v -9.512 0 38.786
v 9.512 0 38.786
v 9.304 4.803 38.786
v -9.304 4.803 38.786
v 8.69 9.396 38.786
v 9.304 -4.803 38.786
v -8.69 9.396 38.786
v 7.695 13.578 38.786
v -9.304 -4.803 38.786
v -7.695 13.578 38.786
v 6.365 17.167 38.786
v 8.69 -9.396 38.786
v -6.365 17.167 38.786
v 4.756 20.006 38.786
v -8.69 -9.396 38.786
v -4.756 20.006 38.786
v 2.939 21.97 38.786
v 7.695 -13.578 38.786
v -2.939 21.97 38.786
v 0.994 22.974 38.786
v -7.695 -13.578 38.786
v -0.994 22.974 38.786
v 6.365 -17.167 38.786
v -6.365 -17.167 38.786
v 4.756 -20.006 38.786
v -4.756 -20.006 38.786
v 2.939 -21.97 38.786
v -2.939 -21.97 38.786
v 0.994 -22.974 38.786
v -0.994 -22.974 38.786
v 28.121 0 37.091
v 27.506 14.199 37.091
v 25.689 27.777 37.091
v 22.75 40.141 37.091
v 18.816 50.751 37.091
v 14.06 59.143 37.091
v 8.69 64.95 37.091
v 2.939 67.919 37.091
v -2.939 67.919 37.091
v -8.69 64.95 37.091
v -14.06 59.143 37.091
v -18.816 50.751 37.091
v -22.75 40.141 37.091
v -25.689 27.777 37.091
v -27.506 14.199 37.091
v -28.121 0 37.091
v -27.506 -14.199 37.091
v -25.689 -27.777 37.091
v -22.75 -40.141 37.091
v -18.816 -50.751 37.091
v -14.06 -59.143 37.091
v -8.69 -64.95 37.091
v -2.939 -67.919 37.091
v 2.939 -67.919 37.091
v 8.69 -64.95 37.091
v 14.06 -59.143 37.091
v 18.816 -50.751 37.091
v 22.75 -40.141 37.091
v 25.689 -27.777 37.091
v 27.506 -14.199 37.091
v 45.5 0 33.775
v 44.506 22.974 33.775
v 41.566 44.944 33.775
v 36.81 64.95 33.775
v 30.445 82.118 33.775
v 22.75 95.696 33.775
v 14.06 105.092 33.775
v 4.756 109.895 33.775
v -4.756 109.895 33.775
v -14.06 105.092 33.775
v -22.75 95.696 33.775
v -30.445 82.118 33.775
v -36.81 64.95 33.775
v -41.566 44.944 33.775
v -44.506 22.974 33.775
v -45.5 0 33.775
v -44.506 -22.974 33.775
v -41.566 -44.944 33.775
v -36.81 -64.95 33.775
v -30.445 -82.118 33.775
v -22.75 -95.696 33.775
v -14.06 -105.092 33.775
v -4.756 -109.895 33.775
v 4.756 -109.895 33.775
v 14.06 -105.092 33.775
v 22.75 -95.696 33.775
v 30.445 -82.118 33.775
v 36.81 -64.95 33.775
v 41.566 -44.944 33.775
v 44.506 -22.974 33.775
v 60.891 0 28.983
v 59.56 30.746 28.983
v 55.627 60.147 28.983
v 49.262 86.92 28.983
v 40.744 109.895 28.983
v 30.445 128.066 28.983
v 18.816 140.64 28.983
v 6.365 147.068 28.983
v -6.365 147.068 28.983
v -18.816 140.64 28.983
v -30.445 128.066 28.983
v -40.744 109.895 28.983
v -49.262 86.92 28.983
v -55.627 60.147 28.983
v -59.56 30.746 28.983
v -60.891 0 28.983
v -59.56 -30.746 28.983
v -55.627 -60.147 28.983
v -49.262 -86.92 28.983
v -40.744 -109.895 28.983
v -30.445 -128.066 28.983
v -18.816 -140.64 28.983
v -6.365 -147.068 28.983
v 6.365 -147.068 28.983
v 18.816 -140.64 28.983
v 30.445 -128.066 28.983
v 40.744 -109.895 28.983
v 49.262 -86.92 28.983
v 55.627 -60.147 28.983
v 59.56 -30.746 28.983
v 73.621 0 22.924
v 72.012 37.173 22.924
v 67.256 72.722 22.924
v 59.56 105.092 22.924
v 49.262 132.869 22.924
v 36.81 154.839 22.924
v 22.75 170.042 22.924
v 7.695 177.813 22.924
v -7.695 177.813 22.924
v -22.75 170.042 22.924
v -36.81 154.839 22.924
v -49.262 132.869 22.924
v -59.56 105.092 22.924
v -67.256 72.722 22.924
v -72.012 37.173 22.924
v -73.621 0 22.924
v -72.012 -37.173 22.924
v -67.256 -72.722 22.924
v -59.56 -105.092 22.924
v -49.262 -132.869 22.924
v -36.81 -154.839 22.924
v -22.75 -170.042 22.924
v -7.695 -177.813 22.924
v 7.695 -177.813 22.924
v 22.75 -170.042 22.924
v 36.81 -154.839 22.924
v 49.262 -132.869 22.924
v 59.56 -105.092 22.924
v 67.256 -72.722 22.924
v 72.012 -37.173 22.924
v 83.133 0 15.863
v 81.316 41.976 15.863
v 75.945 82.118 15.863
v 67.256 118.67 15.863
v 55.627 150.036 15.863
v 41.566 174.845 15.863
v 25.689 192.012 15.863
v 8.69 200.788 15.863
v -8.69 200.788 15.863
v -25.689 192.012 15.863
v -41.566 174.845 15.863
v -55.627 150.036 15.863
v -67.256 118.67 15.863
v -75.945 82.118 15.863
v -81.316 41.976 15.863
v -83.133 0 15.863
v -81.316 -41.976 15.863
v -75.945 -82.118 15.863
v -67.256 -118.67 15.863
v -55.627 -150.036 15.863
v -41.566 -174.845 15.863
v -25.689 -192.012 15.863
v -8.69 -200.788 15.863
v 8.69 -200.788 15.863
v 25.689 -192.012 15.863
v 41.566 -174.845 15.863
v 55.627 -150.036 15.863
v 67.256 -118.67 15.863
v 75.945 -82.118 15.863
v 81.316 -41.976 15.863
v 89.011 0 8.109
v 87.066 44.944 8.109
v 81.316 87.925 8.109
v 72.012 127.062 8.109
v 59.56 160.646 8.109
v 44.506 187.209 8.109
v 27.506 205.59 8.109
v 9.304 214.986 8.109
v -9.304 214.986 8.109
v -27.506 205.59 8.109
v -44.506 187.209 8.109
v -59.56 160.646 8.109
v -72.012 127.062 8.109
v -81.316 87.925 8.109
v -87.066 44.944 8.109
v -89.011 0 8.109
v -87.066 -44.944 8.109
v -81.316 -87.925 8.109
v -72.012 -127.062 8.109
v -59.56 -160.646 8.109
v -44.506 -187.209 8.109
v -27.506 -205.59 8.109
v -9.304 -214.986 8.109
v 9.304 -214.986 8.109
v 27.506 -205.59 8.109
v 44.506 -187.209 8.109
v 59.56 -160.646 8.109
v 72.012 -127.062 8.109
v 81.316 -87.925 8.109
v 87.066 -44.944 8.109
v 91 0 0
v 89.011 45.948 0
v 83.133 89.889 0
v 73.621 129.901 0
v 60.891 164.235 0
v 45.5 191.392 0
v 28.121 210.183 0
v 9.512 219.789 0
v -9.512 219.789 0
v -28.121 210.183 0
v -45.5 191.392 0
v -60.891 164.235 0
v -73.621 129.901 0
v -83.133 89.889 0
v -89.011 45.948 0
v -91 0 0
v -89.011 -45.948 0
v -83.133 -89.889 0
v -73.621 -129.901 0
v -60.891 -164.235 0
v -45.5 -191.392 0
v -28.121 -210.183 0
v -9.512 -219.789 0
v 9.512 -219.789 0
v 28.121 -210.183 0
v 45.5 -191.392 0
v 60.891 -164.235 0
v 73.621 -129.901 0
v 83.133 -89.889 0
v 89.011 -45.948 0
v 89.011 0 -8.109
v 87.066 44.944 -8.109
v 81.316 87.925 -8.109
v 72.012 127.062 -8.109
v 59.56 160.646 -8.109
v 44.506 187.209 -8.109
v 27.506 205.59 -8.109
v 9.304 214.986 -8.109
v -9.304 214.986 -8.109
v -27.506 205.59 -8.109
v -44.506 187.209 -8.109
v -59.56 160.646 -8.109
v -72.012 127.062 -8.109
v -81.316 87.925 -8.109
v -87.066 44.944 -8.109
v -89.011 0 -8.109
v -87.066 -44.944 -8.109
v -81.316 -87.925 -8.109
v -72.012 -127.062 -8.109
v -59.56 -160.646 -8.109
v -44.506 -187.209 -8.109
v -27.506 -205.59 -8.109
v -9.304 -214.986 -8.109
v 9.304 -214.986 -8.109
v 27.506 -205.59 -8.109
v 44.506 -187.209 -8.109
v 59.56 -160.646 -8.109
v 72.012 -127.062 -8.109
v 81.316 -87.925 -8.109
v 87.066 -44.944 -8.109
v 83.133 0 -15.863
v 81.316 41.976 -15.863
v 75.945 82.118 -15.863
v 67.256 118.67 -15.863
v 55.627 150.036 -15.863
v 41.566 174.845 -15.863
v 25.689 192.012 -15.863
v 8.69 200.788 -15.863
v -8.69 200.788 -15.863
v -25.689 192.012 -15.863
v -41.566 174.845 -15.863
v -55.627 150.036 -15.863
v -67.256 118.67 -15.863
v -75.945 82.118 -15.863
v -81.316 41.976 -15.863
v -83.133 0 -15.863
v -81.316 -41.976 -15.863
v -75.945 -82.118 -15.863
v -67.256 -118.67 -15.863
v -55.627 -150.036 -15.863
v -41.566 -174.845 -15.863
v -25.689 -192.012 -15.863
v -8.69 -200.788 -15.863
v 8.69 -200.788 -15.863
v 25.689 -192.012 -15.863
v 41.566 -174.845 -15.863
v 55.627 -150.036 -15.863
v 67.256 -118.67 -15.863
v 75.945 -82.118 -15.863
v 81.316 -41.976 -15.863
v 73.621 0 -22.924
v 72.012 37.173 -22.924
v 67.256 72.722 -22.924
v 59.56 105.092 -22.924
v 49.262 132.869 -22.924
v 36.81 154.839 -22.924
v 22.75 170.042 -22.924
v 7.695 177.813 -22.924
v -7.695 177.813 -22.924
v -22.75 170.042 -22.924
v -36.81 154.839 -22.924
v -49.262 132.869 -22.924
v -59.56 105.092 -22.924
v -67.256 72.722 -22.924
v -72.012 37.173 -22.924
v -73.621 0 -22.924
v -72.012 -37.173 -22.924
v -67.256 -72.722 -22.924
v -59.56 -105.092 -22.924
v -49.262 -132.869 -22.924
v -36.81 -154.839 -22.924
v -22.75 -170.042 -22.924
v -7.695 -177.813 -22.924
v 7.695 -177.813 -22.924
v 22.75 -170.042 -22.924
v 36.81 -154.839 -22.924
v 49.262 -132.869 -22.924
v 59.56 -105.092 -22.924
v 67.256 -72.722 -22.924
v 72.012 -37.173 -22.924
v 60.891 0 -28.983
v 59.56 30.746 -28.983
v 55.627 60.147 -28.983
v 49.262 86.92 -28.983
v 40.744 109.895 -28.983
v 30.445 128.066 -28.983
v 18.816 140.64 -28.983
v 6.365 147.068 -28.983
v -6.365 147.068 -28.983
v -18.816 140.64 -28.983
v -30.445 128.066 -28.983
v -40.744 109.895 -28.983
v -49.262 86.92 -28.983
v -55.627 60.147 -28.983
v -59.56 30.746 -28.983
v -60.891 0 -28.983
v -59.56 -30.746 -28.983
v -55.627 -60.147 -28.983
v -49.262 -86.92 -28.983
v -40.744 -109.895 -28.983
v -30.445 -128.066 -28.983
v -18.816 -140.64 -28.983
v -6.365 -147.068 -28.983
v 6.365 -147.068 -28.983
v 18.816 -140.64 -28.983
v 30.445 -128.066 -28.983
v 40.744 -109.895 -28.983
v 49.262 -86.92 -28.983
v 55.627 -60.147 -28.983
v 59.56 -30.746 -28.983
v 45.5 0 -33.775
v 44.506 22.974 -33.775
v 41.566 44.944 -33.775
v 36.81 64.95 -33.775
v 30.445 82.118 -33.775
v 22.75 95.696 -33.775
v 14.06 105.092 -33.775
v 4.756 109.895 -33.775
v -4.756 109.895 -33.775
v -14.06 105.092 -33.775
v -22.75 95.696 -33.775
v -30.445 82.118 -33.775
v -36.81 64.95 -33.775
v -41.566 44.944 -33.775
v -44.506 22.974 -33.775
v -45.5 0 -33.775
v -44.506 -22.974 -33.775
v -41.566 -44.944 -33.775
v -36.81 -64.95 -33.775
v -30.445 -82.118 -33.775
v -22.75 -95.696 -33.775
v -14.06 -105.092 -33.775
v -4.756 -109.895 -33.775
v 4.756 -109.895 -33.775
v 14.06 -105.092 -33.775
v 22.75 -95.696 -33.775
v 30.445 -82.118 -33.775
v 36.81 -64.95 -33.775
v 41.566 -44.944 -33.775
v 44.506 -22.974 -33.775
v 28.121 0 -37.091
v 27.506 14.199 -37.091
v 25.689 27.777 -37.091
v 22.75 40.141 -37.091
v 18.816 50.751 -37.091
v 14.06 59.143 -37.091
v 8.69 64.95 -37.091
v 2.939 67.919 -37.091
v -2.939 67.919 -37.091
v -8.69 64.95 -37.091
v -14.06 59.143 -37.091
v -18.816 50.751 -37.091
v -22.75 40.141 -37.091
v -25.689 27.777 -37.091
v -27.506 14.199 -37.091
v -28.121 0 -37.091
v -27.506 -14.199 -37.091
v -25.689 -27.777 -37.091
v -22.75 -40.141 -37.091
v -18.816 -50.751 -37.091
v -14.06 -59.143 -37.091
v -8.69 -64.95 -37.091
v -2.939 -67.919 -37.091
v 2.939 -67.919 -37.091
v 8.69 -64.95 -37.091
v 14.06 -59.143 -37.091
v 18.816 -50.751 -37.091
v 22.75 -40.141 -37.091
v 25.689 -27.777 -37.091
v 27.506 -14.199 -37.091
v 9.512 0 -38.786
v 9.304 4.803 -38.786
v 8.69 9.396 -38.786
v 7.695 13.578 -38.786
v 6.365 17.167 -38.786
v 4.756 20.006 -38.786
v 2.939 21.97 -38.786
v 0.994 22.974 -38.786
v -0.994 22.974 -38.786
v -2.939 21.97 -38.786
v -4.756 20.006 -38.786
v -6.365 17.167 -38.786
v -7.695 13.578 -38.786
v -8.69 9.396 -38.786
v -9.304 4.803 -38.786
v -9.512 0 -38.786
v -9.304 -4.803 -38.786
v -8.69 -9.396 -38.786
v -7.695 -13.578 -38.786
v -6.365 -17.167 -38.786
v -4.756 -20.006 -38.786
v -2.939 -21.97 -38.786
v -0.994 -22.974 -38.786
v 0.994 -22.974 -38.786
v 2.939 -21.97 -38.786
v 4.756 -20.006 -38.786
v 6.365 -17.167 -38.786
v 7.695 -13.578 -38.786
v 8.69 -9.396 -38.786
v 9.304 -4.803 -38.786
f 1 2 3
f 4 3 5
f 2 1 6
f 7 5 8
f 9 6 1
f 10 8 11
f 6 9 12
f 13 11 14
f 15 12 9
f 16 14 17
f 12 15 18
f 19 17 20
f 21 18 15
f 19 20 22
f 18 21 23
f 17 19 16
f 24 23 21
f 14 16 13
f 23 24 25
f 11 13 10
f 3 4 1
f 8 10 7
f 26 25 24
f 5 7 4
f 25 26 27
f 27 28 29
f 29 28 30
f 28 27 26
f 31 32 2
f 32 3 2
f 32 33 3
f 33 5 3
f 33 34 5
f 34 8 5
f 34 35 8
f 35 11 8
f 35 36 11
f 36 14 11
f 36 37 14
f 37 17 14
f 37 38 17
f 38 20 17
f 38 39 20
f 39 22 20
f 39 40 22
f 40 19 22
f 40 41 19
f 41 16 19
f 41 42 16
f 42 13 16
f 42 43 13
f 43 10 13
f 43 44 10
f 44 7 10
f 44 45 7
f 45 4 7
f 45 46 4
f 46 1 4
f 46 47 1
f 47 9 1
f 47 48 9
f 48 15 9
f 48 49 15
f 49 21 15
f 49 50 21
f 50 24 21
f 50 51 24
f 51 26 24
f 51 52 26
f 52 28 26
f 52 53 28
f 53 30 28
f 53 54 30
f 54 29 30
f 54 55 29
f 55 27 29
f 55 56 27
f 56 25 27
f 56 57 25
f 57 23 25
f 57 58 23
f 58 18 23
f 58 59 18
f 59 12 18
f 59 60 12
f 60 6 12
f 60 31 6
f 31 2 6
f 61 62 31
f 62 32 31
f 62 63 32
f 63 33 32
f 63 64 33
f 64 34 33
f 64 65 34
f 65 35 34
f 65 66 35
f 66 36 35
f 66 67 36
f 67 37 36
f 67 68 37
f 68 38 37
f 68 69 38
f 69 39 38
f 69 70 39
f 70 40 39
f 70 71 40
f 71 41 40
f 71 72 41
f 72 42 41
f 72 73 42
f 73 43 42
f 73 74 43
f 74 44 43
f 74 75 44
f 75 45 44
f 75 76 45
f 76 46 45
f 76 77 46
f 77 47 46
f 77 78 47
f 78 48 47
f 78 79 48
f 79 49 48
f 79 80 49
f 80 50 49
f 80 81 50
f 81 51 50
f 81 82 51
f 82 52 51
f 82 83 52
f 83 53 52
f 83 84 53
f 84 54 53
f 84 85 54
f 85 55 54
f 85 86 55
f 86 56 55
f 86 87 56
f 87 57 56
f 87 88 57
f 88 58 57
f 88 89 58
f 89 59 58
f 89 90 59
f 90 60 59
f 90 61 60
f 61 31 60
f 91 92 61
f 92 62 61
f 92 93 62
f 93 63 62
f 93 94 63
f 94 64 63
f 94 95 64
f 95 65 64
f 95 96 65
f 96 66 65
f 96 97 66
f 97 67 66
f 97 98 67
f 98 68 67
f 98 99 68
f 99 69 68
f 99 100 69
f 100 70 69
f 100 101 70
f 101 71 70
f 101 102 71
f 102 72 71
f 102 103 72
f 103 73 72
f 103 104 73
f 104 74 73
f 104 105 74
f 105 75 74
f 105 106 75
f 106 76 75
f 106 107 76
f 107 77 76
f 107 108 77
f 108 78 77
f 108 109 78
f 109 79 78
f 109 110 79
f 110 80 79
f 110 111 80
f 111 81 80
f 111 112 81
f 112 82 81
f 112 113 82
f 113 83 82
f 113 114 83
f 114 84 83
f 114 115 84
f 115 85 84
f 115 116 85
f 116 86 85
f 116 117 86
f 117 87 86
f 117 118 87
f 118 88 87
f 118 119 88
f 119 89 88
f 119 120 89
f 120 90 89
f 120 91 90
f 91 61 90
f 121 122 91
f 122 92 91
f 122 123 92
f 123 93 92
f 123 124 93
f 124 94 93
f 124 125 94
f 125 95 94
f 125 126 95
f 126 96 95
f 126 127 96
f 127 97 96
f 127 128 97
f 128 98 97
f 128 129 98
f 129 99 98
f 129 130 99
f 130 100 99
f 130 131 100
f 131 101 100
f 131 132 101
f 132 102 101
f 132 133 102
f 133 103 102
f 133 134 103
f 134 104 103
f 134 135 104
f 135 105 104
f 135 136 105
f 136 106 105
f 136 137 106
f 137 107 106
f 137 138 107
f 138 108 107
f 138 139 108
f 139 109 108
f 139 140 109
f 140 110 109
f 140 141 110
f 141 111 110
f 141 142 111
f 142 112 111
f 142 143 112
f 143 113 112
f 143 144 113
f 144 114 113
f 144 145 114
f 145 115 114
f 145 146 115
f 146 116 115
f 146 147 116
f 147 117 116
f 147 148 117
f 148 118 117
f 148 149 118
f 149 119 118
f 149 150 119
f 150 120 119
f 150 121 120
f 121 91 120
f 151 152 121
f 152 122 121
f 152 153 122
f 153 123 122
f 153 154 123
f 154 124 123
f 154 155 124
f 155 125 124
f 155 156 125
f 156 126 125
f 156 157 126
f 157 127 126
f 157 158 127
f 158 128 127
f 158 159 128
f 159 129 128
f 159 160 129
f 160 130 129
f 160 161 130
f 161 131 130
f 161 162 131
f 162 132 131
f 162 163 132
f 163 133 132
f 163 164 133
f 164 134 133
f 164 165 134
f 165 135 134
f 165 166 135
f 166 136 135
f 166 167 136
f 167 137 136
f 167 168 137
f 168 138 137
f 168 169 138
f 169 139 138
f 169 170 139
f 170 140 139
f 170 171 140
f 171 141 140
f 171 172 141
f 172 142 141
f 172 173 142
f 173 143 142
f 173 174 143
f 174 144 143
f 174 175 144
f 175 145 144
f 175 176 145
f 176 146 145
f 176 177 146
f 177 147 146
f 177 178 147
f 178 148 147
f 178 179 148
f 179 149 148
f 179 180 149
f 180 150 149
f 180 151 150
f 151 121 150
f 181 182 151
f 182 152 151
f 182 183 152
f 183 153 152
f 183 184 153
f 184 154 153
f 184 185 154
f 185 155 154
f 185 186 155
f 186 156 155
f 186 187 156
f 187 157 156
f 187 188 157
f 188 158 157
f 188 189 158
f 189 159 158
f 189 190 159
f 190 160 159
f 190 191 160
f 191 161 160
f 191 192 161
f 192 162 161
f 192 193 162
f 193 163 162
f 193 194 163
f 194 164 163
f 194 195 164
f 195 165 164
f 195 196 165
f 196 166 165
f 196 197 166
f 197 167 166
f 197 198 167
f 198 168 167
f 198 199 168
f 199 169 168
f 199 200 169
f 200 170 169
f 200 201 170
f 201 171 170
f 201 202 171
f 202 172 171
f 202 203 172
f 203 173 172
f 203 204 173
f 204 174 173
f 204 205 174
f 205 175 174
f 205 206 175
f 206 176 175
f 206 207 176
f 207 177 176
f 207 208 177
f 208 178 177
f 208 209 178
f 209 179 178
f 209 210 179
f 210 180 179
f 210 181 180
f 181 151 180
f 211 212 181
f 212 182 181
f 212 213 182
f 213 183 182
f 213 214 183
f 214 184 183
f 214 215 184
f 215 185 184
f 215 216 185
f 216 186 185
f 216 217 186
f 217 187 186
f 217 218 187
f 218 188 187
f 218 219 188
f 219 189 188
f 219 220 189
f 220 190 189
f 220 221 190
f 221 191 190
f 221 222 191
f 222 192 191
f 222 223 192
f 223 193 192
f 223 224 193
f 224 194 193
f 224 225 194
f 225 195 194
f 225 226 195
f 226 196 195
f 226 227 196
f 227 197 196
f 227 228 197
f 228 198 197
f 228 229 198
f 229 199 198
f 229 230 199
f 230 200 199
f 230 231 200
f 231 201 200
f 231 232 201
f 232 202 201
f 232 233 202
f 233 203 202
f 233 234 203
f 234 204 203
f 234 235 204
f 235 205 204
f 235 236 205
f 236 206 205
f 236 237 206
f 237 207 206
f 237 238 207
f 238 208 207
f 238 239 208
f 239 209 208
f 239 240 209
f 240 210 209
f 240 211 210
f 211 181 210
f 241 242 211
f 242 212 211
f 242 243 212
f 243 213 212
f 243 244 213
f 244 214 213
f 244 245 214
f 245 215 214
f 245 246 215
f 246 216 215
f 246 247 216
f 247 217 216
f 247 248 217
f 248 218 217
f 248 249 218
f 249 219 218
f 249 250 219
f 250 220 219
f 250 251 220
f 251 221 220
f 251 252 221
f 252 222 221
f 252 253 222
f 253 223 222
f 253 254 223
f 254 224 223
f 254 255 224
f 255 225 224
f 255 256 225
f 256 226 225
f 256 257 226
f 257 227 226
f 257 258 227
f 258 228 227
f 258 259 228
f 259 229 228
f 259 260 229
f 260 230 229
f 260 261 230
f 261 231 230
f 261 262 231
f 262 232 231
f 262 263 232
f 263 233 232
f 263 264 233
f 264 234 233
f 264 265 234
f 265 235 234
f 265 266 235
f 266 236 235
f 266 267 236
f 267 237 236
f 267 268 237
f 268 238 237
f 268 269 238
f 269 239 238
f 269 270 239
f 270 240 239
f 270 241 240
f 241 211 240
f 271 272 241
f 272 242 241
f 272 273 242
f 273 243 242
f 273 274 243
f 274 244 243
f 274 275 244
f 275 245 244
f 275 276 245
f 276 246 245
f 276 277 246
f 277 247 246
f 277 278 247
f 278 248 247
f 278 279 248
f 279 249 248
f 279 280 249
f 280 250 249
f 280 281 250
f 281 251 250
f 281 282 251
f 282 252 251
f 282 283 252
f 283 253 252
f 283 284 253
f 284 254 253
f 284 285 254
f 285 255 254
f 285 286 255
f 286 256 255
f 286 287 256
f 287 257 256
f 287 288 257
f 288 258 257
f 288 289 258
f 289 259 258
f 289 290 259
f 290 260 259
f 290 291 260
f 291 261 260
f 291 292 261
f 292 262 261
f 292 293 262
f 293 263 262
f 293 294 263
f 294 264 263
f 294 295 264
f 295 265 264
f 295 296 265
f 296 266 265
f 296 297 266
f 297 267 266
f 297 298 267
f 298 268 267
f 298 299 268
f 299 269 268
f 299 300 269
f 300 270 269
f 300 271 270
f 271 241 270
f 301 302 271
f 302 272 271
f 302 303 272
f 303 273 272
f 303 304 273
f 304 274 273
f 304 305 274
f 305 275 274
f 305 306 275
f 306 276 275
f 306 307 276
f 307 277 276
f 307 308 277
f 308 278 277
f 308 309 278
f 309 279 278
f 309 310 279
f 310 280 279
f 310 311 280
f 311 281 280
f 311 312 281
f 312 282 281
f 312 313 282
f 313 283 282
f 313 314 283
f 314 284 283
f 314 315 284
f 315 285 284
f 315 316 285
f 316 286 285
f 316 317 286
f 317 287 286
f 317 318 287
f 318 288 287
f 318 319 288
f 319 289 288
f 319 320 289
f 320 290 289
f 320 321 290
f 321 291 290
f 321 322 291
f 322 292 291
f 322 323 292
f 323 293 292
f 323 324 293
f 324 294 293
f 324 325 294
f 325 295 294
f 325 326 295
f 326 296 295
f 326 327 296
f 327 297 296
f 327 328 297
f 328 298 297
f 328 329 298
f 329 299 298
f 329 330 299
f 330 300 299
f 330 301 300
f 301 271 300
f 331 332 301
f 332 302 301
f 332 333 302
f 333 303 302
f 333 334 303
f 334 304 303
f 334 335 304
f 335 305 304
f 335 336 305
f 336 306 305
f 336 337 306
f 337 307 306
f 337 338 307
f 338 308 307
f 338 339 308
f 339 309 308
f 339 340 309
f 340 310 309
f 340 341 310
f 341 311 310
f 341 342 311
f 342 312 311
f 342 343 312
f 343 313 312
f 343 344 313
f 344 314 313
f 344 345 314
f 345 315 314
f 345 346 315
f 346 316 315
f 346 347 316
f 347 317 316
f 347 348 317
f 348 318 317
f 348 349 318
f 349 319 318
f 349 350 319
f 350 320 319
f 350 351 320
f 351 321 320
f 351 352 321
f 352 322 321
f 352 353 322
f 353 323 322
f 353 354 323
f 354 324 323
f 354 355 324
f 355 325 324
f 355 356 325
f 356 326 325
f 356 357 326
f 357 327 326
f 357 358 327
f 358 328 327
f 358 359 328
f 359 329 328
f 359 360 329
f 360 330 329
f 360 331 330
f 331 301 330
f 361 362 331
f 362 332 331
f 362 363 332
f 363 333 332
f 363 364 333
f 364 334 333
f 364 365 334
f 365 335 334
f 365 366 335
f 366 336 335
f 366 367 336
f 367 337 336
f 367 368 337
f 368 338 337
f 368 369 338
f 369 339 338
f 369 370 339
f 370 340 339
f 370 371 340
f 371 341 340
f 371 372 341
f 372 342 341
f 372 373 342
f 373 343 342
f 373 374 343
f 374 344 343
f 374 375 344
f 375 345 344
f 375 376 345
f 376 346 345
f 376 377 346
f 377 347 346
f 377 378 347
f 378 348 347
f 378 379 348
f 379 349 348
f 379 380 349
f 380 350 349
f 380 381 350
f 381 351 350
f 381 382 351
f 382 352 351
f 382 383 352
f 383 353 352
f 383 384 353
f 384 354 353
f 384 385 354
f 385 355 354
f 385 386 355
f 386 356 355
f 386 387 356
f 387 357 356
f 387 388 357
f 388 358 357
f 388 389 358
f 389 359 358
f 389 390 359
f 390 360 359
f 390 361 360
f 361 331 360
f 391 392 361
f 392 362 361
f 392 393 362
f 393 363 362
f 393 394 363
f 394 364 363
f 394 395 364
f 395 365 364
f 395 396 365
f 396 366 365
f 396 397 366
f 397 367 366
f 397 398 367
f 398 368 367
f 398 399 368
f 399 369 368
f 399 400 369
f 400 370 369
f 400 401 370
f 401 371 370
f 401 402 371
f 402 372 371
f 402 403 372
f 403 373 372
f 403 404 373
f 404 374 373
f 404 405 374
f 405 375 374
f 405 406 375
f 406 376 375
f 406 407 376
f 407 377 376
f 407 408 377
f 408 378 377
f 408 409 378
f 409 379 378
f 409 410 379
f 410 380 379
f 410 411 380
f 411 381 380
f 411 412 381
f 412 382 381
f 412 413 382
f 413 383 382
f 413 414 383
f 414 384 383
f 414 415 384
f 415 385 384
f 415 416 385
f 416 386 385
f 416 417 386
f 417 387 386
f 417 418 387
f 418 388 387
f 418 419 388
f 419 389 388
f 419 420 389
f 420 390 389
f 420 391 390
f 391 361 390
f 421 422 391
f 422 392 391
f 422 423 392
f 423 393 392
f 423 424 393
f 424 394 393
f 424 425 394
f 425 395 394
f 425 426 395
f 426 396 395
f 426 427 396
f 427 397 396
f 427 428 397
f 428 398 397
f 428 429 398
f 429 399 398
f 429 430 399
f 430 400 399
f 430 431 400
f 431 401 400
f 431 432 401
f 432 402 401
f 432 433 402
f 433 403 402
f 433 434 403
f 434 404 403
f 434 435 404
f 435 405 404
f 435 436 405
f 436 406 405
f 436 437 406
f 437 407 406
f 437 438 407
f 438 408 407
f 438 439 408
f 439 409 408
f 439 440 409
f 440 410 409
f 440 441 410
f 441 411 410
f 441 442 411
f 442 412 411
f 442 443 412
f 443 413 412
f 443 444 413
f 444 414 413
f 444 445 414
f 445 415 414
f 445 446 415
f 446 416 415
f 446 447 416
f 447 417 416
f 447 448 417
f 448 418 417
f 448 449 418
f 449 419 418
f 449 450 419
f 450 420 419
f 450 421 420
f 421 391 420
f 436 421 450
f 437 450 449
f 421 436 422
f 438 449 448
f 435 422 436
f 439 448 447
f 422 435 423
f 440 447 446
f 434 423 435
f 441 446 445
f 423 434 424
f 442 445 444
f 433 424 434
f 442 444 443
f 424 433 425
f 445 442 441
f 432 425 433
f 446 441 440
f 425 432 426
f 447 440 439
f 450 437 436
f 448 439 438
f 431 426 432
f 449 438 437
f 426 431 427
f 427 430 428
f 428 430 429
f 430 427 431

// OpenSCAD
// Generated by SolidPython 1.0.1 on 2020-07-29 00:46:48


scale(v = [7, 17, 3]) {
	sphere(r = 13);
}
/***********************************************
*********      SolidPython code:      **********
************************************************
 
# import packages: SolidPython
from solid import *
from solid.utils import *
from itertools import chain, combinations, permutations


class Resize:

    def __init__(self, scad_file):
        self.scad_file = scad_file
        #self.scad_file = import_scad(scad_file)
        # cone/cylinder param:
        self.r1 = 0
        self.r2 = 0
        self.h = 0
        # rectangular prism param:
        self.w = 0
        self.l = 0
        # ellipse param:
        self.r = 0

    # import OpenScad code (file name corresponds to shape)


    # classify shape + parameters
    def assign(self, param1, param2, param3):
        if self.scad_file == 'cone.scad':
            self.r1 = param1
            self.r2 = param2
            self.h = param3
        elif self.scad_file == 'cylinder.scad':
            self.r1 = param1
            self.r2 = param2
            self.h = param3
        elif self.scad_file == 'rectangularPrism.scad':
            self.h = param1
            self.l = param2
            self.w = param3
        else:
            self.r = param1
            self.h = param2

    # resize parameters
    def iterate(self):
        x = range(3, 20, 2)
        i = 1
        if self.scad_file == 'cone.scad':
            tempList = list(permutations(x, 2))
            for temp in tempList:
                param1 = temp[0]
                param2 = temp[1]
                filepath = 'produced_scad_files/' + 'cone' + str(param1) + '_' + str(param2) + '_' + '.scad'
                scad_render_to_file(cylinder(h=param1, r1=param2, r2=0), filepath)

        elif self.scad_file == 'cylinder.scad':
            tempList = list(permutations(x, 3))
            for temp in tempList:
                param1 = temp[0]
                param2 = temp[1]
                filepath = 'produced_scad_files/' + 'cylinder' + str(param1) + '_' + str(param2) + '_' + '.scad'
                scad_render_to_file(cylinder(h=param1, r1=param2, r2=param2), filepath)

        elif self.scad_file == 'rectangularPrism.scad':
            tempList = list(permutations(x, 3))
            for temp in tempList:
                param1 = temp[0]
                param2 = temp[1]
                param3 = temp[2]
                filepath = 'produced_scad_files/' + 'rectangularPrism' + str(param1) + '_' + str(param2) + '_' + str(
                    param3) + '.scad'
                scad_render_to_file(cube(size=(param1, param2, param3)), filepath)

        elif self.scad_file == 'ellipse.scad':
            tempList = list(permutations(x, 4))
            for temp in tempList:
                param1 = temp[0]
                param2 = temp[1]
                param3 = temp[2]
                param4 = temp[3]
                filepath = 'produced_scad_files/' + 'ellipse' + str(param1) + '_' + str(param2) + '_' + str(param3) + '_' + str(param4) + '.scad'
                scad_render_to_file(scale([param1, param2, param3])(sphere(r=param4)), filepath)

    def render_to_scadfile(self):
        scad_render_to_file(scad, 'example.scad') 
 
************************************************/
